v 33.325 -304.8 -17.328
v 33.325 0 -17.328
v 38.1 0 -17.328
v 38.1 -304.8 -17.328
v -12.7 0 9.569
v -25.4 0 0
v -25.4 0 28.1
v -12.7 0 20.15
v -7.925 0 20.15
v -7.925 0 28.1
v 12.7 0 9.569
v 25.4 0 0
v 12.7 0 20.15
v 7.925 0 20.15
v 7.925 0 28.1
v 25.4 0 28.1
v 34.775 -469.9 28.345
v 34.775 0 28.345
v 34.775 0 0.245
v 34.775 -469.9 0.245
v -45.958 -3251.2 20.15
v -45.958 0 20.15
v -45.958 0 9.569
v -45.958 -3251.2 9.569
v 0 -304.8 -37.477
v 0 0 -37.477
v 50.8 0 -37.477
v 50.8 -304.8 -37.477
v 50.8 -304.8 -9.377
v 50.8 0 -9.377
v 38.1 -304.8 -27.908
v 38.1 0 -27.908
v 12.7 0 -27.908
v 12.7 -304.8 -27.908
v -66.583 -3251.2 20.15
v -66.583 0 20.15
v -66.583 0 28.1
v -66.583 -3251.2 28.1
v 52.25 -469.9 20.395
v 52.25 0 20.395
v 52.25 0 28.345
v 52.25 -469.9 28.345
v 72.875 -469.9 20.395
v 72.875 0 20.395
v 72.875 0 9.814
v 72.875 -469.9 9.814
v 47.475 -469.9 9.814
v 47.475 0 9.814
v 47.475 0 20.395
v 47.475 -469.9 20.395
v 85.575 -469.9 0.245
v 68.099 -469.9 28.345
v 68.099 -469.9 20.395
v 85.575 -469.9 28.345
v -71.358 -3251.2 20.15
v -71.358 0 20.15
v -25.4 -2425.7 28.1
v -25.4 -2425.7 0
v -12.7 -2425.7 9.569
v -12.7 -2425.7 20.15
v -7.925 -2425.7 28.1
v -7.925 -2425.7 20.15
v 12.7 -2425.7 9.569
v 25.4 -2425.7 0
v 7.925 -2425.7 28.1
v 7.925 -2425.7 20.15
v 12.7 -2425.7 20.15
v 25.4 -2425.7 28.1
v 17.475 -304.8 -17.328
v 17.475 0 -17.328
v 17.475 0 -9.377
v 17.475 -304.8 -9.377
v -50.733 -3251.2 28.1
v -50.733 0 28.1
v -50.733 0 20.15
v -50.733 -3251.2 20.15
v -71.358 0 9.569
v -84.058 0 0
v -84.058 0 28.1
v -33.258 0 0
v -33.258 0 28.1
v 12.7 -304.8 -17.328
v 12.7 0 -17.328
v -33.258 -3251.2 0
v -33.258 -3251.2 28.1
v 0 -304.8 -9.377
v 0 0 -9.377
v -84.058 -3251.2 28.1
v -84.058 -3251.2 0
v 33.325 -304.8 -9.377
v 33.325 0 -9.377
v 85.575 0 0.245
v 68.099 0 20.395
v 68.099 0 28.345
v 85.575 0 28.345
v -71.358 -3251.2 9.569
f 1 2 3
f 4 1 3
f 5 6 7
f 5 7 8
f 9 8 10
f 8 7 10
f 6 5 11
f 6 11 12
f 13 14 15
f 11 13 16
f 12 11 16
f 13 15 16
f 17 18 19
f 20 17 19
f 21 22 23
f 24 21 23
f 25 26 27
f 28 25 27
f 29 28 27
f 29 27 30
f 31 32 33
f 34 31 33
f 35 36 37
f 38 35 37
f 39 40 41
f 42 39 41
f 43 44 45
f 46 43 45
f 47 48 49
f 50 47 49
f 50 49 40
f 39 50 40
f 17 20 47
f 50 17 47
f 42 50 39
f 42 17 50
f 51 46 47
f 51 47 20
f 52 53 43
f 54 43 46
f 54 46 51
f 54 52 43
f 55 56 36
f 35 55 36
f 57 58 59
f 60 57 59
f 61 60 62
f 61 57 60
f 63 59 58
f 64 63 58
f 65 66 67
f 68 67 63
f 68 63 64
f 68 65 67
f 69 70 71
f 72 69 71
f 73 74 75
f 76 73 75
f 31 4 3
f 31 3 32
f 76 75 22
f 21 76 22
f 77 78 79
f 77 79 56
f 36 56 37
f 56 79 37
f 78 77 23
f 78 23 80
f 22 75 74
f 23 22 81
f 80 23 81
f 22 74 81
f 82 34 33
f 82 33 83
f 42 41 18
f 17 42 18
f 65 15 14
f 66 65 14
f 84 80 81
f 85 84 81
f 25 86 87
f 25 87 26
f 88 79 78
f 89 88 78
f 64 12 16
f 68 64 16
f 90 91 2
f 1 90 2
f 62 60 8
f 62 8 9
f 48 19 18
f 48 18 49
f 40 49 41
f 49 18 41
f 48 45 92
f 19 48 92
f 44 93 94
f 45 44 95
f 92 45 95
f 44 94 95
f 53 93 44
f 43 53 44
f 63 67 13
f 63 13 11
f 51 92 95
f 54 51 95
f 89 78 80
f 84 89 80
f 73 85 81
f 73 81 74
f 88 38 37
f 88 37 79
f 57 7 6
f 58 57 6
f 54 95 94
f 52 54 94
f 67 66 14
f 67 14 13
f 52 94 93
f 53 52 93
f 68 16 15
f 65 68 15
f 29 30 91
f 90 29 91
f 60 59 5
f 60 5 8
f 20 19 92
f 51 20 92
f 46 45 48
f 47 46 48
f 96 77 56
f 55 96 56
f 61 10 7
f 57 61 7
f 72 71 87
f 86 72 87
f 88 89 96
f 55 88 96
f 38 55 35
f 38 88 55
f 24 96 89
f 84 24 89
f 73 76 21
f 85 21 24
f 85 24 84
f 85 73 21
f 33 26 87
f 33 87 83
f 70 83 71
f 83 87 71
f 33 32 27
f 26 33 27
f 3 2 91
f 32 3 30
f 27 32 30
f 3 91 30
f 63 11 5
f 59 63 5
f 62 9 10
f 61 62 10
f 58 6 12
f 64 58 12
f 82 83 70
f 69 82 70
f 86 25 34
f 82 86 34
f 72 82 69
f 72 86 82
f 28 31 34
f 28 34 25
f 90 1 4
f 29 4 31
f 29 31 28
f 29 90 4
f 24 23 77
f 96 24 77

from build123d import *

# Parameters (mm, degrees)
F4_DEPTH = 3251.2
F5_DEPTH = 2425.7
F6_DEPTH = 469.9
F7_DEPTH = 304.8


with BuildPart() as f4:
    # F1 (on Front) → F4 (new body)
    with BuildSketch(Plane.XZ):
        Polygon((-84.057853, 0), (-58.657853, 0), (-33.257853, 0), (-33.257853, 28.099747), (-50.733053, 28.099747), (-50.733053, 20.149547), (-45.957853, 20.149547), (-45.957853, 9.56893), (-71.357853, 9.56893), (-71.357853, 20.149547), (-66.582653, 20.149547), (-66.582653, 28.099747), (-84.057853, 28.099747), align=None)
    extrude(amount=F4_DEPTH)


with BuildPart() as f5:
    # F0 (on Front) → F5 (new body)
    with BuildSketch(Plane.XZ):
        Polygon((-25.4, 0), (0, 0), (25.4, 0), (25.4, 28.099747), (7.9248, 28.099747), (7.9248, 20.149547), (12.7, 20.149547), (12.7, 9.56893), (-12.7, 9.56893), (-12.7, 20.149547), (-7.9248, 20.149547), (-7.9248, 28.099747), (-25.4, 28.099747), align=None)
    extrude(amount=F5_DEPTH)


with BuildPart() as f6:
    # F2 (on Front) → F6 (new body)
    with BuildSketch(Plane.XZ):
        Polygon((34.774553, 0.244995), (60.174553, 0.244995), (85.574553, 0.244995), (85.574553, 28.344742), (68.099353, 28.344742), (68.099353, 20.394542), (72.874553, 20.394542), (72.874553, 9.813925), (47.474553, 9.813925), (47.474553, 20.394542), (52.249753, 20.394542), (52.249753, 28.344742), (34.774553, 28.344742), align=None)
    extrude(amount=F6_DEPTH)


with BuildPart() as f7:
    # F3 (on Front) → F7 (new body)
    with BuildSketch(Plane.XZ):
        Polygon((0, -37.477192), (25.4, -37.477192), (50.8, -37.477192), (50.8, -9.377445), (33.3248, -9.377445), (33.3248, -17.327645), (38.1, -17.327645), (38.1, -27.908261), (12.7, -27.908261), (12.7, -17.327645), (17.4752, -17.327645), (17.4752, -9.377445), (0, -9.377445), align=None)
    extrude(amount=F7_DEPTH)


solid = Compound([f4.part, f5.part, f6.part, f7.part])
